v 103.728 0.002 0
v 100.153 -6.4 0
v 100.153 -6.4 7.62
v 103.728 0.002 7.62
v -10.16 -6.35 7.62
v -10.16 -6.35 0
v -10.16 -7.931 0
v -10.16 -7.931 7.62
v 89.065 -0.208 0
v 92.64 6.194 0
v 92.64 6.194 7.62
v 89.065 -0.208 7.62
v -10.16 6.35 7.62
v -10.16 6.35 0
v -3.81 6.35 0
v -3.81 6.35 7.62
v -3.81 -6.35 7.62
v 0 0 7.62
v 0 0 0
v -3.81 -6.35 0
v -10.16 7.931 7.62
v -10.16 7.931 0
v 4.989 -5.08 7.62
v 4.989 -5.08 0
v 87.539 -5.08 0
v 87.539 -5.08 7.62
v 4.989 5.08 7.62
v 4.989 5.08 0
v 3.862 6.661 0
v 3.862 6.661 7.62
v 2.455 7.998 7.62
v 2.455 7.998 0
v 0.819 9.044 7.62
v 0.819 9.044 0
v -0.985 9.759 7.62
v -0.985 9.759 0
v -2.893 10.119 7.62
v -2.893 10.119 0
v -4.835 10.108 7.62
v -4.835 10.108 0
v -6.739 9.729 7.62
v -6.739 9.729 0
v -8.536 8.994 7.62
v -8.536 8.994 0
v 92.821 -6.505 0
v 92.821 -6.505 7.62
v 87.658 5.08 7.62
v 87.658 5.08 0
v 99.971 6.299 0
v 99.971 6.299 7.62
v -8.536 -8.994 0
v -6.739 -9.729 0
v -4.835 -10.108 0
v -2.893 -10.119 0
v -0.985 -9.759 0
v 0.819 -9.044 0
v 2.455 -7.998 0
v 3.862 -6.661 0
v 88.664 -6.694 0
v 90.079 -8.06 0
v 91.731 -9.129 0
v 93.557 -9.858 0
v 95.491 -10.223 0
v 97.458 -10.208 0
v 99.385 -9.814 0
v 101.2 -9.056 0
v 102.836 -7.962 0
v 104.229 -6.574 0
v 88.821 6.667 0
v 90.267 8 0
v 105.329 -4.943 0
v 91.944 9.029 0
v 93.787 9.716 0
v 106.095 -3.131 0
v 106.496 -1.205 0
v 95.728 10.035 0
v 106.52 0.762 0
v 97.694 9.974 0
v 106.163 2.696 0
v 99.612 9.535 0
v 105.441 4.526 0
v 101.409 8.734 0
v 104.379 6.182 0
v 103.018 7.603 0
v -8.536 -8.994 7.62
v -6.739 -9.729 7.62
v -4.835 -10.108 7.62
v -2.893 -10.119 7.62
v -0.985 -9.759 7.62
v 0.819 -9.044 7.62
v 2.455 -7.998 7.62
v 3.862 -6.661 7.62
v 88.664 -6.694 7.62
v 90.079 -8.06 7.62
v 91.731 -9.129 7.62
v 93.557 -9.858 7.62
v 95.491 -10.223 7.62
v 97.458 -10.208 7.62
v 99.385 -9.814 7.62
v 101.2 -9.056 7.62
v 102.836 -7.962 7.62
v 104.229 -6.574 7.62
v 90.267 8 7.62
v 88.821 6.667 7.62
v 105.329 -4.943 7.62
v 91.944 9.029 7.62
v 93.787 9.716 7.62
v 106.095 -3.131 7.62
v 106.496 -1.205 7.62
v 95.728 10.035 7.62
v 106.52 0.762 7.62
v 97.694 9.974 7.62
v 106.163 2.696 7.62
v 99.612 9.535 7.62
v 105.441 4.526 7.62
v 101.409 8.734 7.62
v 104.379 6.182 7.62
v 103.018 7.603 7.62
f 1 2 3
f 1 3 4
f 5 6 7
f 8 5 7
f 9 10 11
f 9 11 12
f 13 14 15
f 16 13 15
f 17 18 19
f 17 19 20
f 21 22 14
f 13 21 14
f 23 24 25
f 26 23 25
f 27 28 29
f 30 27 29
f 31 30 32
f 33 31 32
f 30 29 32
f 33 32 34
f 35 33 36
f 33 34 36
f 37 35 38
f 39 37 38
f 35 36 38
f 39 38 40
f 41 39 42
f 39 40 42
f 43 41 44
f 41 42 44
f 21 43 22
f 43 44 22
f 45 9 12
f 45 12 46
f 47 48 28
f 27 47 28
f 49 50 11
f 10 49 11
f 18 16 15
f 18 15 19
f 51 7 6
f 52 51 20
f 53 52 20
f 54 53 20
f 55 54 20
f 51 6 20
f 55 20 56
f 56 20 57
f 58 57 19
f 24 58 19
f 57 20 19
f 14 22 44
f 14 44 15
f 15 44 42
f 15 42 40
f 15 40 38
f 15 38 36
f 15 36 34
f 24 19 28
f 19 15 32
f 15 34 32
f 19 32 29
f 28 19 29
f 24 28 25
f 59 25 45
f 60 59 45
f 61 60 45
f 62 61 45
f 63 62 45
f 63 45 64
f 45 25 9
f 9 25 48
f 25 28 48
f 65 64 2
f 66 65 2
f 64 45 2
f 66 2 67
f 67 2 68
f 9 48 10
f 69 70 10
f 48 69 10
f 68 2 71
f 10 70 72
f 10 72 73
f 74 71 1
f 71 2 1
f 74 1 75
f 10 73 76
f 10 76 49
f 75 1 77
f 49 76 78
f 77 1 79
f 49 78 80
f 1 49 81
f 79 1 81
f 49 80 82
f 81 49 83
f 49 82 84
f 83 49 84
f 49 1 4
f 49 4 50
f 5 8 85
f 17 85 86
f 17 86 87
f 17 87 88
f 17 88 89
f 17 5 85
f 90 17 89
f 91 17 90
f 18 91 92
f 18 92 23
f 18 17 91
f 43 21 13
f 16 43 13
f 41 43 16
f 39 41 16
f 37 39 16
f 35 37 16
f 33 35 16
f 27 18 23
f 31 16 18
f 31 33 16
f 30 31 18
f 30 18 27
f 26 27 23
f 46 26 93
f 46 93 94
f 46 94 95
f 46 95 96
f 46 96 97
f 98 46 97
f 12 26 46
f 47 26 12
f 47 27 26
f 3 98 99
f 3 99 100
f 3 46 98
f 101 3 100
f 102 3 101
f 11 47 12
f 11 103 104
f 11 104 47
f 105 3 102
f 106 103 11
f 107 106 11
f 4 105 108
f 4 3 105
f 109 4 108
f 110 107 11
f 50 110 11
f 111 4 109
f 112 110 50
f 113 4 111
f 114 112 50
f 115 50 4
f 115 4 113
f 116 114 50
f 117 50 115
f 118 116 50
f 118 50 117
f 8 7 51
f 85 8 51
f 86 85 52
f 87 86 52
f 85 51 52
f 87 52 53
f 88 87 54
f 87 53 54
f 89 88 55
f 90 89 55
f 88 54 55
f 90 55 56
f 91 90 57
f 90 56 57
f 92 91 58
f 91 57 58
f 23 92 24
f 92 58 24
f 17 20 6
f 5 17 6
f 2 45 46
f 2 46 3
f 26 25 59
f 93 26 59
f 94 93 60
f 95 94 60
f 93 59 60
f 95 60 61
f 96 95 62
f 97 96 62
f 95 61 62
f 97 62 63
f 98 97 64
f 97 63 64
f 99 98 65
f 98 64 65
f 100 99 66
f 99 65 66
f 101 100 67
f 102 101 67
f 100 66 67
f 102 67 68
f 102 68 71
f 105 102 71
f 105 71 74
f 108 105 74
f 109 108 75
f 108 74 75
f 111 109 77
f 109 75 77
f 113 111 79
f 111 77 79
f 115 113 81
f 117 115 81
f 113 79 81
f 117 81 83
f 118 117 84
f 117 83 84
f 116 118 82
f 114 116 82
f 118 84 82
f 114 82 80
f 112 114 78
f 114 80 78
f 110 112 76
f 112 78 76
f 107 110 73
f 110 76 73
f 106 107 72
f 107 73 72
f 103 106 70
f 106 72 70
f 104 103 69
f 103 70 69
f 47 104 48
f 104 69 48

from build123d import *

# Parameters (mm, degrees)
BOSS_EXTRUDE2_DEPTH = 7.62


with BuildPart() as part:
    # Sketch3 → Boss-Extrude2 (new body)
    with BuildSketch(Plane.XY):
        with BuildLine():
            Line((-10.16, 6.35), (-3.81, 6.35))
            Line((-3.81, 6.35), (0, 0))
            Line((0, 0), (-3.81, -6.35))
            Line((-3.81, -6.35), (-10.16, -6.35))
            Line((-10.16, -6.35), (-10.16, -7.931147458))
            ThreePointArc((-10.16, -7.931147458), (-1.930787936, -9.984696391), (4.988818102, -5.08))
            Line((4.988818102, -5.08), (87.538818102, -5.08))
            ThreePointArc((87.538818102, -5.08), (106.555699626, -0.222294413), (87.657954776, 5.08))
            Line((87.657954776, 5.08), (4.988818102, 5.08))
            ThreePointArc((4.988818102, 5.08), (-1.930787936, 9.984696391), (-10.16, 7.931147458))
            Line((-10.16, 7.931147458), (-10.16, 6.35))
        make_face()
        Polygon((100.153044825, -6.400065038), (103.727996034, 0.001736052), (99.971349264, 6.298635161), (92.639751286, 6.19373318), (89.064800078, -0.20806791), (92.821446847, -6.504967018), align=None, mode=Mode.SUBTRACT)
    extrude(amount=BOSS_EXTRUDE2_DEPTH)


solid = part.part
